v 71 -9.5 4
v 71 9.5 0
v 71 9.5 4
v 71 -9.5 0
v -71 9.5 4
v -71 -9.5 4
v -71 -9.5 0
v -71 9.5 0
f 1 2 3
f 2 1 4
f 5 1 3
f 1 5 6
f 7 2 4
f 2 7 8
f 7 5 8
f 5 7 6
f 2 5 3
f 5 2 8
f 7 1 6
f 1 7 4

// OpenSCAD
// Owned ballast: reference CAD only, not a printed replacement.
// Origin: bottom face centre. X=length, Y=width, Z=thickness.
/* [Variant] */
variant = "A"; // [A,B]
/* [Confirmed dimensions (mm)] */
a_length = 142;
a_width = 19;
a_thickness = 4;
b_length = 163.5;
b_width = 16;
b_thickness = 3;
b_end_offset = 20;
b_hole_pitches = [37.5, 48.5, 37.5];
/* [Provisional dimension - measure actual ballast] */
b_hole_d_provisional = 5.5; // M5 clearance through hole; actual diameter not measured.
/* [Hidden] */
$fn = 128;
epsilon = 0.01;

// Generic plate module, usable with `use <ballast_plate.scad>`.
module ballast_plate(length, width, thickness, hole_x_from_left, hole_d) {
    assert(length > 0 && width > 0 && thickness > 0);
    assert(len(hole_x_from_left) == 0 || (hole_d > 0 && hole_d < width));
    difference() {
        translate([-length/2, -width/2, 0]) cube([length, width, thickness]);
        for (x = hole_x_from_left) {
            assert(x > hole_d/2 && x < length-hole_d/2);
            translate([x-length/2, 0, -epsilon])
                cylinder(d=hole_d, h=thickness+2*epsilon);
        }
    }
}

assert(variant == "A" || variant == "B", "variant must be A or B");
b_hole_x = [b_end_offset,
            b_end_offset+b_hole_pitches[0],
            b_end_offset+b_hole_pitches[0]+b_hole_pitches[1],
            b_end_offset+b_hole_pitches[0]+b_hole_pitches[1]+b_hole_pitches[2]];
assert(abs(b_hole_x[3]+b_end_offset-b_length) < 0.001, "B length/pitches inconsistent");
if (variant == "A")
    ballast_plate(a_length, a_width, a_thickness, [], 0);
else
    ballast_plate(b_length, b_width, b_thickness, b_hole_x, b_hole_d_provisional);
